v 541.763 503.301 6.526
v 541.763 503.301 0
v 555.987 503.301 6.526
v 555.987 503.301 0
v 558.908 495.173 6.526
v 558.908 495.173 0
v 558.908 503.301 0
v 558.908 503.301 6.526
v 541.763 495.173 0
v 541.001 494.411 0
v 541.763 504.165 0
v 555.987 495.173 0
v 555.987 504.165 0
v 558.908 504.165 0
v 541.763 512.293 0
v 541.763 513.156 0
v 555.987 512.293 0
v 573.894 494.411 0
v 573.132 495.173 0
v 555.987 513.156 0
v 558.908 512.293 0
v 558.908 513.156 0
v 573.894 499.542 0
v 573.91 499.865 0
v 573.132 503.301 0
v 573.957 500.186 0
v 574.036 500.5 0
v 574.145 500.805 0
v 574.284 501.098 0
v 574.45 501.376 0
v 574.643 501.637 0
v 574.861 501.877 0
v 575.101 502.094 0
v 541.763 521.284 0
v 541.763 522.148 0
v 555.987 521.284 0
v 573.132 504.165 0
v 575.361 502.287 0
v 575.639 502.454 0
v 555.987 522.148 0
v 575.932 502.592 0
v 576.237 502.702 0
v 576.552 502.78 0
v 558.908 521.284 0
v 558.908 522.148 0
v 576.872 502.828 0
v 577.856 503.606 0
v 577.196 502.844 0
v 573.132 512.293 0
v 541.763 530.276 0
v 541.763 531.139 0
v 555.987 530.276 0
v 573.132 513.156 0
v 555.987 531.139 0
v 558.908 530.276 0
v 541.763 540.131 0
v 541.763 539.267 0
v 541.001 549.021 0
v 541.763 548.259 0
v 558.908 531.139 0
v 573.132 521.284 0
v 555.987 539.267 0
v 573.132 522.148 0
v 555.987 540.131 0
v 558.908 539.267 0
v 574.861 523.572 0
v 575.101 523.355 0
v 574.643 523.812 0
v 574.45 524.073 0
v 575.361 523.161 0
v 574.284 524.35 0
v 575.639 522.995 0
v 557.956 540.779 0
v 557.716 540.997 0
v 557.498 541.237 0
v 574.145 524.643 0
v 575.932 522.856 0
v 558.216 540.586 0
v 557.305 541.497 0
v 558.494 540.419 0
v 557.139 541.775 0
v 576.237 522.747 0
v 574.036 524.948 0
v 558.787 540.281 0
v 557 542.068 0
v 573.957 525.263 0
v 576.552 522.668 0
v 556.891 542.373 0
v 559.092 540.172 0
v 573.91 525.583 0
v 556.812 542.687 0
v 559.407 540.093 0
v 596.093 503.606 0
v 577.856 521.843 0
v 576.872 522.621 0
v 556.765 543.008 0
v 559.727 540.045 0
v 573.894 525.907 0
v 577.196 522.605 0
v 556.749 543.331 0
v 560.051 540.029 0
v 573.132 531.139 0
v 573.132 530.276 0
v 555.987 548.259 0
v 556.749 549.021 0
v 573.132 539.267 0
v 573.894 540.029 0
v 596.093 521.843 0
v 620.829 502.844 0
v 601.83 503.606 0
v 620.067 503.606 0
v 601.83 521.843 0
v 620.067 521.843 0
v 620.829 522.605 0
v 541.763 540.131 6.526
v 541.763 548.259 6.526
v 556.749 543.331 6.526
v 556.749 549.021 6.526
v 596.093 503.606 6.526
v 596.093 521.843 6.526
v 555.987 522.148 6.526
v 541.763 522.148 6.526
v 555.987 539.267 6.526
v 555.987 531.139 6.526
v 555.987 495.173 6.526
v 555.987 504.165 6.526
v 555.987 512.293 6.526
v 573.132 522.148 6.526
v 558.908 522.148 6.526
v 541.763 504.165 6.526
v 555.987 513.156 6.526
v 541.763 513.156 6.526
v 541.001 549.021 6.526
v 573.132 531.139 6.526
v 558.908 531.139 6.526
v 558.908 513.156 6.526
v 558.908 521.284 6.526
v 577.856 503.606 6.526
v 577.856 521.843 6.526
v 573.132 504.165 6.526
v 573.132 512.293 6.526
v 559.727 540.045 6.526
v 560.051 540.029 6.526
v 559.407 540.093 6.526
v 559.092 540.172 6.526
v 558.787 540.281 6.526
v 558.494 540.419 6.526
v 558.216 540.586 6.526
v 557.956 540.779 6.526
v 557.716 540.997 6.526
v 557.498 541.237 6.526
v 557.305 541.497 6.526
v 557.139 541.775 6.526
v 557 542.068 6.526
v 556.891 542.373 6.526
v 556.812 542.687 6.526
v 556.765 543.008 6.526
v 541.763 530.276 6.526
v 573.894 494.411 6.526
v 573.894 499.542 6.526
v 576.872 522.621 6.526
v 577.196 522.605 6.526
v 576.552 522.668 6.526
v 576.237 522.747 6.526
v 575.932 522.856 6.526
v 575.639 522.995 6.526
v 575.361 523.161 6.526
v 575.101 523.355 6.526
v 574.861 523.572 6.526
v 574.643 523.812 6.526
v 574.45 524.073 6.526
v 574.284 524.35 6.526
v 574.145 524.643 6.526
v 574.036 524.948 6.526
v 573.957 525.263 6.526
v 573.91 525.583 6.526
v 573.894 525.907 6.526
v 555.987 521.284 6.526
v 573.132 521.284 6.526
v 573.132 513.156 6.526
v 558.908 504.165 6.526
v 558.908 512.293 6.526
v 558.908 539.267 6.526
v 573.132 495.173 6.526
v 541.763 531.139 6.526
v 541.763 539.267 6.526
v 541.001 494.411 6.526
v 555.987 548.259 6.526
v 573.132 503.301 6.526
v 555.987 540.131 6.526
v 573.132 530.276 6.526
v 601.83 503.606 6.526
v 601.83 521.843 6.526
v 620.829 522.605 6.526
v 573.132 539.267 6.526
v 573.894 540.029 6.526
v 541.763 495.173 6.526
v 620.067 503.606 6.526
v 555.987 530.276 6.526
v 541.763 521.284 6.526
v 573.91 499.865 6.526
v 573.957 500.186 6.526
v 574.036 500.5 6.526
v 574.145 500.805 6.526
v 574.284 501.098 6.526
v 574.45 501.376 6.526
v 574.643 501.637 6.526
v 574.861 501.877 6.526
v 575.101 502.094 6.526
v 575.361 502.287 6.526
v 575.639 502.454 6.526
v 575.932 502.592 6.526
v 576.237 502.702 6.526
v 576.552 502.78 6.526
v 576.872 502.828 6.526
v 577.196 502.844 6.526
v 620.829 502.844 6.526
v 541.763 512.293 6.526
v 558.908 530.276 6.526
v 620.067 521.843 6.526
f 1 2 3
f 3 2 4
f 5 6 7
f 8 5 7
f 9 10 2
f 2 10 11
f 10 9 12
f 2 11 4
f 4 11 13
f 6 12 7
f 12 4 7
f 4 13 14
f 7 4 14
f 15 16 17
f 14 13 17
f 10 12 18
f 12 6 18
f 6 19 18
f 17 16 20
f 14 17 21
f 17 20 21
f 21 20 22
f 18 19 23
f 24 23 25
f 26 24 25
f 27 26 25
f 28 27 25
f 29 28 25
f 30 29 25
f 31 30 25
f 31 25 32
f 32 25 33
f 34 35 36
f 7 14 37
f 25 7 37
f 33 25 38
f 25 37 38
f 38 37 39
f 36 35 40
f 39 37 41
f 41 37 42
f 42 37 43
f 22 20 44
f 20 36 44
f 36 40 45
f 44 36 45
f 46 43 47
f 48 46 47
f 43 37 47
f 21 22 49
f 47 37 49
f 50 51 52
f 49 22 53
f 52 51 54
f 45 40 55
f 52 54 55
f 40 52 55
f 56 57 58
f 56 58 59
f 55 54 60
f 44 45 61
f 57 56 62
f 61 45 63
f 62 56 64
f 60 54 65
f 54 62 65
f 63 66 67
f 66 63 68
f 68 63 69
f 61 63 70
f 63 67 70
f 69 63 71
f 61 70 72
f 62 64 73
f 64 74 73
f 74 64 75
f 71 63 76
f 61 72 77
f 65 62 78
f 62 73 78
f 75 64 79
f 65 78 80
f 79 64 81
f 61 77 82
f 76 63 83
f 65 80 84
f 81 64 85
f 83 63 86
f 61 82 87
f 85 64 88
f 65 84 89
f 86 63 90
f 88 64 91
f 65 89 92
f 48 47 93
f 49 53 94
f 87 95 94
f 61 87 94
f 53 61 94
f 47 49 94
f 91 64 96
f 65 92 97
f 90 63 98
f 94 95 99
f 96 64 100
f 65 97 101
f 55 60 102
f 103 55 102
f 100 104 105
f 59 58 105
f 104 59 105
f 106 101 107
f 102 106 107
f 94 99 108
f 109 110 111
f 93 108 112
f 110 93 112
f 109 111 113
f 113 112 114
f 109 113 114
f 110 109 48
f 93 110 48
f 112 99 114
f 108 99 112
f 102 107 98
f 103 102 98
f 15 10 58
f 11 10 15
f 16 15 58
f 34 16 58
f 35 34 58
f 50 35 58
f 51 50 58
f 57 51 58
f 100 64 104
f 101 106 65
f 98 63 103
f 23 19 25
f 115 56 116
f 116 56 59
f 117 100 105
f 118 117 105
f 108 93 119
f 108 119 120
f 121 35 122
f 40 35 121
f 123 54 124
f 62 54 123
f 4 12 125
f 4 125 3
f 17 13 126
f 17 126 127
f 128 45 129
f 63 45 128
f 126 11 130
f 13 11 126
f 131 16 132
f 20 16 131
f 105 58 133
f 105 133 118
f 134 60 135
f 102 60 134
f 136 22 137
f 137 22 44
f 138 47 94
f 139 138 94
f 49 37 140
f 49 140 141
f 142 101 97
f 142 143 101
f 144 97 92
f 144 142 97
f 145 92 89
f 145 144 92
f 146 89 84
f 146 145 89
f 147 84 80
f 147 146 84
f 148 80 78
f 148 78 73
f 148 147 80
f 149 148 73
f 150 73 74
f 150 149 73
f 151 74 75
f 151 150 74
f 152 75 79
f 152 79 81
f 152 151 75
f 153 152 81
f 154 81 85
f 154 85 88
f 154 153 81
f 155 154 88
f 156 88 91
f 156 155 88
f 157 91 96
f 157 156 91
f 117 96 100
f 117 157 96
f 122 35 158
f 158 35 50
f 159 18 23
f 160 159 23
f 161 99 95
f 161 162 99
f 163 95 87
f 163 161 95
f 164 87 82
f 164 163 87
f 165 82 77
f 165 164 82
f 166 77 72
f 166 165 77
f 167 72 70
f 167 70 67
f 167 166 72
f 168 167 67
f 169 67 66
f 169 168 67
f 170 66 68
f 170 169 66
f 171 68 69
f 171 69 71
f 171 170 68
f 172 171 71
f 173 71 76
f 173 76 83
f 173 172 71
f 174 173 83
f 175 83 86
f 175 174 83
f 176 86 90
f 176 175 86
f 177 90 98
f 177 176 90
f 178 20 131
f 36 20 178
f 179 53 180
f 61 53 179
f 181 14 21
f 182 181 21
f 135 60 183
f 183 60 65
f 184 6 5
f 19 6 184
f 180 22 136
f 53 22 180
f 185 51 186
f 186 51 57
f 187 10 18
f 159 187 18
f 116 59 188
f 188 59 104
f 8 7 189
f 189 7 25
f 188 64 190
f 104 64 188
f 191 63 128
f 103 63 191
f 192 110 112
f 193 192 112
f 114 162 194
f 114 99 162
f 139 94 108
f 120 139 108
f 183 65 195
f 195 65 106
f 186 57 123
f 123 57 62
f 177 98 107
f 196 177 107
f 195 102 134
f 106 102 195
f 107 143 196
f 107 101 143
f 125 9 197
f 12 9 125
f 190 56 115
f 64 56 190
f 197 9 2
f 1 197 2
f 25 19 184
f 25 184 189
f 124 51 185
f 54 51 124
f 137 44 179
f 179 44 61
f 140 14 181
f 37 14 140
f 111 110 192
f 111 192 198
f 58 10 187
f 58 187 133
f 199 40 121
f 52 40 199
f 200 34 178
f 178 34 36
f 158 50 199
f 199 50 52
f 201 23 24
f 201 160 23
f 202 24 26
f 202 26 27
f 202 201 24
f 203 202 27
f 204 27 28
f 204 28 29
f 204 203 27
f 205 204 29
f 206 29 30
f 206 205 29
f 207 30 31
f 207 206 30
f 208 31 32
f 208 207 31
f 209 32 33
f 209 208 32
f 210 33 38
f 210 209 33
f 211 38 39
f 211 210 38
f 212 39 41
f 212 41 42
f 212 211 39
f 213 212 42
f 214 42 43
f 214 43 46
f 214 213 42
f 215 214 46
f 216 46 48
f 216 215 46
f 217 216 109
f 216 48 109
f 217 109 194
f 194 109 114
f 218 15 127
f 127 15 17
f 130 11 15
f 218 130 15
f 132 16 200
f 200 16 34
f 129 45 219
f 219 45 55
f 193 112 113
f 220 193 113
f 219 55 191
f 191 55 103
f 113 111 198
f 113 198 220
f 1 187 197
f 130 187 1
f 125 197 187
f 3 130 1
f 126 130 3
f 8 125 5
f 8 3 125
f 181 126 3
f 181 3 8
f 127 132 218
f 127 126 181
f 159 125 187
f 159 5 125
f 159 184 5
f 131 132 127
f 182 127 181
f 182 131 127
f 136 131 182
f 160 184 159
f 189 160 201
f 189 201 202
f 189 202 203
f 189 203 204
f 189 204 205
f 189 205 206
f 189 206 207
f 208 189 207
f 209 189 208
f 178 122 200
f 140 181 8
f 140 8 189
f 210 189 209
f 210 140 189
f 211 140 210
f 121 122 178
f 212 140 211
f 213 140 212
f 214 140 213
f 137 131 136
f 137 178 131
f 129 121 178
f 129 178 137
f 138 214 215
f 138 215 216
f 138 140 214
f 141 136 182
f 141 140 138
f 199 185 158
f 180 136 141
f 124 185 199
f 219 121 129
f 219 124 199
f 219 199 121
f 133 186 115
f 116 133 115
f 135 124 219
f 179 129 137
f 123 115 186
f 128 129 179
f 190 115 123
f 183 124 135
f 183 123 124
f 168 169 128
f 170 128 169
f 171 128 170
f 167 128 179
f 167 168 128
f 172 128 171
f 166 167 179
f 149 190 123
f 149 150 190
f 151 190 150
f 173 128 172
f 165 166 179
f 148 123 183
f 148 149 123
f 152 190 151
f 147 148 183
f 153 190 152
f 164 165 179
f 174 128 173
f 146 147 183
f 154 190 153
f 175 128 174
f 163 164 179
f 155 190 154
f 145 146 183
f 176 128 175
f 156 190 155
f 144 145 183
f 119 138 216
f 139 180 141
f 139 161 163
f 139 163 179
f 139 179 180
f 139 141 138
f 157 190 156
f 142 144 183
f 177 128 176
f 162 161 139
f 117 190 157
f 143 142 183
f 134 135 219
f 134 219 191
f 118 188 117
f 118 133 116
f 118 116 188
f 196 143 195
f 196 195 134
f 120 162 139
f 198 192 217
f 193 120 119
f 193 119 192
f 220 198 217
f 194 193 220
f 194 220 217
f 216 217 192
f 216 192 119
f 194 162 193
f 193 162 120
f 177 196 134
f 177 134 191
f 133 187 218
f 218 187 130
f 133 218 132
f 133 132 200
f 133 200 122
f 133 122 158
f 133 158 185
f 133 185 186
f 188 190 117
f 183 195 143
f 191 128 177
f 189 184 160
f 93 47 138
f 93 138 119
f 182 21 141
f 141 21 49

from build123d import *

# Parameters (mm, degrees)
EXTRUDE_THIN1_OUTLINE_W      = 19.7612
EXTRUDE_THIN1_OUTLINE_H      = 19.7612
EXTRUDE_THIN1_OUTLINE_W_2    = 18.2372
EXTRUDE_THIN1_OUTLINE_H_2    = 18.2372
EXTRUDE_THIN1_DEPTH          = 6.52585
EXTRUDE_THIN1_2_OUTLINE_W    = 15.748
EXTRUDE_THIN1_2_OUTLINE_H    = 9.652
EXTRUDE_THIN1_2_OUTLINE_W_2  = 14.224
EXTRUDE_THIN1_2_OUTLINE_H_2  = 8.128
EXTRUDE_THIN1_2_DEPTH        = 6.52585
EXTRUDE_THIN1_3_OUTLINE_W    = 15.748
EXTRUDE_THIN1_3_OUTLINE_H    = 9.652
EXTRUDE_THIN1_3_OUTLINE_W_2  = 14.224
EXTRUDE_THIN1_3_OUTLINE_H_2  = 8.128
EXTRUDE_THIN1_3_DEPTH        = 6.52585
EXTRUDE_THIN1_4_OUTLINE_W    = 15.748
EXTRUDE_THIN1_4_OUTLINE_H    = 9.652
EXTRUDE_THIN1_4_OUTLINE_W_2  = 14.224
EXTRUDE_THIN1_4_OUTLINE_H_2  = 8.128
EXTRUDE_THIN1_4_DEPTH        = 6.52585
EXTRUDE_THIN1_5_OUTLINE_W    = 15.748
EXTRUDE_THIN1_5_OUTLINE_H    = 9.652
EXTRUDE_THIN1_5_OUTLINE_W_2  = 14.224
EXTRUDE_THIN1_5_OUTLINE_H_2  = 8.128
EXTRUDE_THIN1_5_DEPTH        = 6.52585
EXTRUDE_THIN1_6_OUTLINE_W    = 15.748
EXTRUDE_THIN1_6_OUTLINE_H    = 9.652
EXTRUDE_THIN1_6_OUTLINE_W_2  = 14.224
EXTRUDE_THIN1_6_OUTLINE_H_2  = 8.128
EXTRUDE_THIN1_6_DEPTH        = 6.52585
EXTRUDE_THIN1_7_OUTLINE_W    = 15.748
EXTRUDE_THIN1_7_OUTLINE_H    = 9.652
EXTRUDE_THIN1_7_OUTLINE_W_2  = 14.224
EXTRUDE_THIN1_7_OUTLINE_H_2  = 8.128
EXTRUDE_THIN1_7_DEPTH        = 6.52585
EXTRUDE_THIN1_8_OUTLINE_W    = 15.748
EXTRUDE_THIN1_8_OUTLINE_H    = 9.652
EXTRUDE_THIN1_8_OUTLINE_W_2  = 14.224
EXTRUDE_THIN1_8_OUTLINE_H_2  = 8.128
EXTRUDE_THIN1_8_DEPTH        = 6.52585
EXTRUDE_THIN1_9_OUTLINE_W    = 15.748
EXTRUDE_THIN1_9_OUTLINE_H    = 9.652
EXTRUDE_THIN1_9_OUTLINE_W_2  = 14.224
EXTRUDE_THIN1_9_OUTLINE_H_2  = 8.128
EXTRUDE_THIN1_9_DEPTH        = 6.52585
EXTRUDE_THIN1_10_OUTLINE_W   = 15.748
EXTRUDE_THIN1_10_OUTLINE_H   = 9.652
EXTRUDE_THIN1_10_OUTLINE_W_2 = 14.224
EXTRUDE_THIN1_10_OUTLINE_H_2 = 8.128
EXTRUDE_THIN1_10_DEPTH       = 6.52585
EXTRUDE_THIN1_11_OUTLINE_W   = 15.748
EXTRUDE_THIN1_11_OUTLINE_H   = 9.652
EXTRUDE_THIN1_11_OUTLINE_W_2 = 14.224
EXTRUDE_THIN1_11_OUTLINE_H_2 = 8.128
EXTRUDE_THIN1_11_DEPTH       = 6.52585
EXTRUDE_THIN1_12_OUTLINE_W   = 15.748
EXTRUDE_THIN1_12_OUTLINE_H   = 9.652
EXTRUDE_THIN1_12_OUTLINE_W_2 = 14.224
EXTRUDE_THIN1_12_OUTLINE_H_2 = 8.128
EXTRUDE_THIN1_12_DEPTH       = 6.52585
EXTRUDE_THIN1_13_OUTLINE_W   = 19.7612
EXTRUDE_THIN1_13_OUTLINE_H   = 19.7612
EXTRUDE_THIN1_13_OUTLINE_W_2 = 18.2372
EXTRUDE_THIN1_13_OUTLINE_H_2 = 18.2372
EXTRUDE_THIN1_13_DEPTH       = 6.52585
BOSS_EXTRUDE1_START          = -6.52585
SKETCH3_W                    = 1.397
SKETCH3_H                    = 45.6184
SKETCH3_W_2                  = 3.2004
SKETCH3_H_2                  = 19.7612
SKETCH3_W_3                  = 4.212549516
BOSS_EXTRUDE1_DEPTH          = 6.52585
FILLET1_R                    = 3.302


# Read off the part's stored shape, not the designer's step: Extrude-Thin1
with BuildPart() as part:
    # Extrude-Thin1 outline → Extrude-Thin1 (new body)
    with BuildSketch(Plane.XY):
        with Locations((610.948497092, 512.7244)):
            Rectangle(EXTRUDE_THIN1_OUTLINE_W, EXTRUDE_THIN1_OUTLINE_H)
        with Locations((610.948497092, 512.7244)):
            Rectangle(EXTRUDE_THIN1_OUTLINE_W_2, EXTRUDE_THIN1_OUTLINE_H_2, mode=Mode.SUBTRACT)
    extrude(amount=EXTRUDE_THIN1_DEPTH)



with BuildPart() as body_2:
    # Extrude-Thin1 2 outline → Extrude-Thin1 2 (new body)
    with BuildSketch(Plane.XY):
        with Locations((548.874747576, 544.195)):
            Rectangle(EXTRUDE_THIN1_2_OUTLINE_W, EXTRUDE_THIN1_2_OUTLINE_H)
        with Locations((548.874747576, 544.195)):
            Rectangle(EXTRUDE_THIN1_2_OUTLINE_W_2, EXTRUDE_THIN1_2_OUTLINE_H_2, mode=Mode.SUBTRACT)
    extrude(amount=EXTRUDE_THIN1_2_DEPTH)


with BuildPart() as body_3:
    # Extrude-Thin1 3 outline → Extrude-Thin1 3 (new body)
    with BuildSketch(Plane.XY):
        with Locations((548.874747576, 535.2034)):
            Rectangle(EXTRUDE_THIN1_3_OUTLINE_W, EXTRUDE_THIN1_3_OUTLINE_H)
        with Locations((548.874747576, 535.2034)):
            Rectangle(EXTRUDE_THIN1_3_OUTLINE_W_2, EXTRUDE_THIN1_3_OUTLINE_H_2, mode=Mode.SUBTRACT)
    extrude(amount=EXTRUDE_THIN1_3_DEPTH)


with BuildPart() as body_4:
    # Extrude-Thin1 4 outline → Extrude-Thin1 4 (new body)
    with BuildSketch(Plane.XY):
        with Locations((548.874747576, 526.2118)):
            Rectangle(EXTRUDE_THIN1_4_OUTLINE_W, EXTRUDE_THIN1_4_OUTLINE_H)
        with Locations((548.874747576, 526.2118)):
            Rectangle(EXTRUDE_THIN1_4_OUTLINE_W_2, EXTRUDE_THIN1_4_OUTLINE_H_2, mode=Mode.SUBTRACT)
    extrude(amount=EXTRUDE_THIN1_4_DEPTH)


with BuildPart() as body_5:
    # Extrude-Thin1 5 outline → Extrude-Thin1 5 (new body)
    with BuildSketch(Plane.XY):
        with Locations((548.874747576, 517.2202)):
            Rectangle(EXTRUDE_THIN1_5_OUTLINE_W, EXTRUDE_THIN1_5_OUTLINE_H)
        with Locations((548.874747576, 517.2202)):
            Rectangle(EXTRUDE_THIN1_5_OUTLINE_W_2, EXTRUDE_THIN1_5_OUTLINE_H_2, mode=Mode.SUBTRACT)
    extrude(amount=EXTRUDE_THIN1_5_DEPTH)


with BuildPart() as body_6:
    # Extrude-Thin1 6 outline → Extrude-Thin1 6 (new body)
    with BuildSketch(Plane.XY):
        with Locations((548.874747576, 508.2286)):
            Rectangle(EXTRUDE_THIN1_6_OUTLINE_W, EXTRUDE_THIN1_6_OUTLINE_H)
        with Locations((548.874747576, 508.2286)):
            Rectangle(EXTRUDE_THIN1_6_OUTLINE_W_2, EXTRUDE_THIN1_6_OUTLINE_H_2, mode=Mode.SUBTRACT)
    extrude(amount=EXTRUDE_THIN1_6_DEPTH)


with BuildPart() as body_7:
    # Extrude-Thin1 7 outline → Extrude-Thin1 7 (new body)
    with BuildSketch(Plane.XY):
        with Locations((548.874747576, 499.237)):
            Rectangle(EXTRUDE_THIN1_7_OUTLINE_W, EXTRUDE_THIN1_7_OUTLINE_H)
        with Locations((548.874747576, 499.237)):
            Rectangle(EXTRUDE_THIN1_7_OUTLINE_W_2, EXTRUDE_THIN1_7_OUTLINE_H_2, mode=Mode.SUBTRACT)
    extrude(amount=EXTRUDE_THIN1_7_DEPTH)


with BuildPart() as body_8:
    # Extrude-Thin1 8 outline → Extrude-Thin1 8 (new body)
    with BuildSketch(Plane.XY):
        with Locations((566.019747576, 499.237)):
            Rectangle(EXTRUDE_THIN1_8_OUTLINE_W, EXTRUDE_THIN1_8_OUTLINE_H)
        with Locations((566.019747576, 499.237)):
            Rectangle(EXTRUDE_THIN1_8_OUTLINE_W_2, EXTRUDE_THIN1_8_OUTLINE_H_2, mode=Mode.SUBTRACT)
    extrude(amount=EXTRUDE_THIN1_8_DEPTH)


with BuildPart() as body_9:
    # Extrude-Thin1 9 outline → Extrude-Thin1 9 (new body)
    with BuildSketch(Plane.XY):
        with Locations((566.019747576, 508.2286)):
            Rectangle(EXTRUDE_THIN1_9_OUTLINE_W, EXTRUDE_THIN1_9_OUTLINE_H)
        with Locations((566.019747576, 508.2286)):
            Rectangle(EXTRUDE_THIN1_9_OUTLINE_W_2, EXTRUDE_THIN1_9_OUTLINE_H_2, mode=Mode.SUBTRACT)
    extrude(amount=EXTRUDE_THIN1_9_DEPTH)


with BuildPart() as body_10:
    # Extrude-Thin1 10 outline → Extrude-Thin1 10 (new body)
    with BuildSketch(Plane.XY):
        with Locations((566.019747576, 517.2202)):
            Rectangle(EXTRUDE_THIN1_10_OUTLINE_W, EXTRUDE_THIN1_10_OUTLINE_H)
        with Locations((566.019747576, 517.2202)):
            Rectangle(EXTRUDE_THIN1_10_OUTLINE_W_2, EXTRUDE_THIN1_10_OUTLINE_H_2, mode=Mode.SUBTRACT)
    extrude(amount=EXTRUDE_THIN1_10_DEPTH)


with BuildPart() as body_11:
    # Extrude-Thin1 11 outline → Extrude-Thin1 11 (new body)
    with BuildSketch(Plane.XY):
        with Locations((566.019747576, 535.2034)):
            Rectangle(EXTRUDE_THIN1_11_OUTLINE_W, EXTRUDE_THIN1_11_OUTLINE_H)
        with Locations((566.019747576, 535.2034)):
            Rectangle(EXTRUDE_THIN1_11_OUTLINE_W_2, EXTRUDE_THIN1_11_OUTLINE_H_2, mode=Mode.SUBTRACT)
    extrude(amount=EXTRUDE_THIN1_11_DEPTH)


with BuildPart() as body_12:
    # Extrude-Thin1 12 outline → Extrude-Thin1 12 (new body)
    with BuildSketch(Plane.XY):
        with Locations((566.019747576, 526.2118)):
            Rectangle(EXTRUDE_THIN1_12_OUTLINE_W, EXTRUDE_THIN1_12_OUTLINE_H)
        with Locations((566.019747576, 526.2118)):
            Rectangle(EXTRUDE_THIN1_12_OUTLINE_W_2, EXTRUDE_THIN1_12_OUTLINE_H_2, mode=Mode.SUBTRACT)
    extrude(amount=EXTRUDE_THIN1_12_DEPTH)


with BuildPart() as body_13:
    # Extrude-Thin1 13 outline → Extrude-Thin1 13 (new body)
    with BuildSketch(Plane.XY):
        with Locations((586.974747576, 512.7244)):
            Rectangle(EXTRUDE_THIN1_13_OUTLINE_W, EXTRUDE_THIN1_13_OUTLINE_H)
        with Locations((586.974747576, 512.7244)):
            Rectangle(EXTRUDE_THIN1_13_OUTLINE_W_2, EXTRUDE_THIN1_13_OUTLINE_H_2, mode=Mode.SUBTRACT)
    extrude(amount=EXTRUDE_THIN1_13_DEPTH)


with BuildPart() as part_1:
    add(part.part)

    add(body_2.part)  # Boss-Extrude1 merges body 2

    add(body_3.part)  # Boss-Extrude1 merges body 3

    add(body_4.part)  # Boss-Extrude1 merges body 4

    add(body_5.part)  # Boss-Extrude1 merges body 5

    add(body_6.part)  # Boss-Extrude1 merges body 6

    add(body_7.part)  # Boss-Extrude1 merges body 7

    add(body_8.part)  # Boss-Extrude1 merges body 8

    add(body_9.part)  # Boss-Extrude1 merges body 9

    add(body_10.part)  # Boss-Extrude1 merges body 10

    add(body_11.part)  # Boss-Extrude1 merges body 11

    add(body_12.part)  # Boss-Extrude1 merges body 12

    add(body_13.part)  # Boss-Extrude1 merges body 13
    # Sketch3 → Boss-Extrude1 (add)
    with BuildSketch(Plane.XY.offset(6.52585).offset(BOSS_EXTRUDE1_START)):
        with Locations((557.447247576, 517.2202)):
            Rectangle(SKETCH3_W, SKETCH3_H)
        with Locations((575.493947576, 512.7244)):
            Rectangle(SKETCH3_W_2, SKETCH3_H_2)
        with Locations((598.961622334, 512.7244)):
            Rectangle(SKETCH3_W_3, SKETCH3_H_2)
    extrude(amount=BOSS_EXTRUDE1_DEPTH)

    # Fillet1
    fillet1_edges = [part_1.edges().sort_by_distance(p)[0] for p in [
        (556.748747576, 540.0294, 3.262925),
        (573.893747576, 502.8438, 3.262925),
        (573.893747576, 522.605, 3.262925),
    ]]
    fillet(fillet1_edges, radius=FILLET1_R)


solid = part_1.part
